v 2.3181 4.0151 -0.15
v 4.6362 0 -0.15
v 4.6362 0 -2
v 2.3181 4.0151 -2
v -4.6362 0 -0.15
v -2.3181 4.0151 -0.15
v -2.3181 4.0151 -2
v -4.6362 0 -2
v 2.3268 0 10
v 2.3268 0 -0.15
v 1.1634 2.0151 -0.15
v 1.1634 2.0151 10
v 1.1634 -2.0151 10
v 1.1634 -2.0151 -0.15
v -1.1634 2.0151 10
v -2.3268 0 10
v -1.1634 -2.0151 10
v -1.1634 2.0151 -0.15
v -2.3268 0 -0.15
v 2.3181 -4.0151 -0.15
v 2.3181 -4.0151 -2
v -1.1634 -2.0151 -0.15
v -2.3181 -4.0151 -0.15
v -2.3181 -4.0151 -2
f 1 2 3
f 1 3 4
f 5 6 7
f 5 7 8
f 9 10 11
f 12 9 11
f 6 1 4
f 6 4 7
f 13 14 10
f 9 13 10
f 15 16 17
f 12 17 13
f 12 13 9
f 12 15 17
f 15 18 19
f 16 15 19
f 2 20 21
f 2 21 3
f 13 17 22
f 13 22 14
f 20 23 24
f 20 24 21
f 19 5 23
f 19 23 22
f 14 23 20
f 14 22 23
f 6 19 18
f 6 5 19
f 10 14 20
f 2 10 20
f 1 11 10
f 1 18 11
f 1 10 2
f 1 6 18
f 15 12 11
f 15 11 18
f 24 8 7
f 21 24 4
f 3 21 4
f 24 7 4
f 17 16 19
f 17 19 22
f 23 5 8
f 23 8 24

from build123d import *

# Parameters (mm, degrees)
BOSS_EXTRUDE1_DEPTH = 10
BOSS_EXTRUDE2_DEPTH = 2
MOVE_FACE1_BY       = 0.15
MOVE_FACE1_2_BY     = 0.15
MOVE_FACE1_3_BY     = 0.15
MOVE_FACE1_4_BY     = 0.15
MOVE_FACE1_5_BY     = 0.15
MOVE_FACE1_6_BY     = 0.15
MOVE_FACE1_7_BY     = 0.15
MOVE_FACE1_8_BY     = 0.15
MOVE_FACE1_9_BY     = 0.15
MOVE_FACE1_10_BY    = 0.15
MOVE_FACE1_11_BY    = 0.15
MOVE_FACE1_12_BY    = 0.15
MOVE_FACE1_13_BY    = 0.15


with BuildPart() as part:
    # Sketch1 → Boss-Extrude1 (new body)
    with BuildSketch(Plane.XY):
        Polygon((-1.25, -2.165063509), (1.25, -2.165063509), (2.5, 0), (1.25, 2.165063509), (-1.25, 2.165063509), (-2.5, 0), align=None)
    extrude(amount=BOSS_EXTRUDE1_DEPTH)

    # Sketch1<3> → Boss-Extrude2 (add)
    with BuildSketch(Plane.XY):
        Polygon((-2.404700538, -4.165063509), (2.404700538, -4.165063509), (4.809401077, 0), (2.404700538, 4.165063509), (-2.404700538, 4.165063509), (-4.809401077, 0), align=None)
    extrude(amount=-BOSS_EXTRUDE2_DEPTH)

    # Move Face1: a face moved inward by 0.15
    extrude(part.faces().sort_by_distance((0, -3.332050808, 0))[0], amount=MOVE_FACE1_BY, dir=(0, 0, -1), mode=Mode.SUBTRACT)

    # Move Face1 2: a face moved inward by 0.15
    extrude(part.faces().sort_by_distance((0, 4.165063509, -1))[0], amount=MOVE_FACE1_2_BY, dir=(0, -1, 0), mode=Mode.SUBTRACT)

    # Move Face1 3: a face moved inward by 0.15
    extrude(part.faces().sort_by_distance((3.607050808, 2.082531755, -1))[0], amount=MOVE_FACE1_3_BY, dir=(-0.866025404, -0.5, 0), mode=Mode.SUBTRACT)

    # Move Face1 4: a face moved inward by 0.15
    extrude(part.faces().sort_by_distance((3.607050808, -2.082531755, -1))[0], amount=MOVE_FACE1_4_BY, dir=(-0.866025404, 0.5, 0), mode=Mode.SUBTRACT)

    # Move Face1 5: a face moved inward by 0.15
    extrude(part.faces().sort_by_distance((0, -4.165063509, -1))[0], amount=MOVE_FACE1_5_BY, dir=(0, 1, 0), mode=Mode.SUBTRACT)

    # Move Face1 6: a face moved inward by 0.15
    extrude(part.faces().sort_by_distance((-3.607050808, 2.082531755, -1))[0], amount=MOVE_FACE1_6_BY, dir=(0.866025404, -0.5, 0), mode=Mode.SUBTRACT)

    # Move Face1 7: a face moved inward by 0.15
    extrude(part.faces().sort_by_distance((-3.607050808, -2.082531755, -1))[0], amount=MOVE_FACE1_7_BY, dir=(0.866025404, 0.5, 0), mode=Mode.SUBTRACT)

    # Move Face1 8: a face moved inward by 0.15
    extrude(part.faces().sort_by_distance((1.875, 1.082531755, 5))[0], amount=MOVE_FACE1_8_BY, dir=(-0.866025404, -0.5, 0), mode=Mode.SUBTRACT)

    # Move Face1 9: a face moved inward by 0.15
    extrude(part.faces().sort_by_distance((0, 2.165063509, 5))[0], amount=MOVE_FACE1_9_BY, dir=(0, -1, 0), mode=Mode.SUBTRACT)

    # Move Face1 10: a face moved inward by 0.15
    extrude(part.faces().sort_by_distance((-1.875, 1.082531755, 5))[0], amount=MOVE_FACE1_10_BY, dir=(0.866025404, -0.5, 0), mode=Mode.SUBTRACT)

    # Move Face1 11: a face moved inward by 0.15
    extrude(part.faces().sort_by_distance((-1.875, -1.082531755, 5))[0], amount=MOVE_FACE1_11_BY, dir=(0.866025404, 0.5, 0), mode=Mode.SUBTRACT)

    # Move Face1 12: a face moved inward by 0.15
    extrude(part.faces().sort_by_distance((0, -2.165063509, 5))[0], amount=MOVE_FACE1_12_BY, dir=(0, 1, 0), mode=Mode.SUBTRACT)

    # Move Face1 13: a face moved inward by 0.15
    extrude(part.faces().sort_by_distance((1.875, -1.082531755, 5))[0], amount=MOVE_FACE1_13_BY, dir=(-0.866025404, 0.5, 0), mode=Mode.SUBTRACT)


solid = part.part
